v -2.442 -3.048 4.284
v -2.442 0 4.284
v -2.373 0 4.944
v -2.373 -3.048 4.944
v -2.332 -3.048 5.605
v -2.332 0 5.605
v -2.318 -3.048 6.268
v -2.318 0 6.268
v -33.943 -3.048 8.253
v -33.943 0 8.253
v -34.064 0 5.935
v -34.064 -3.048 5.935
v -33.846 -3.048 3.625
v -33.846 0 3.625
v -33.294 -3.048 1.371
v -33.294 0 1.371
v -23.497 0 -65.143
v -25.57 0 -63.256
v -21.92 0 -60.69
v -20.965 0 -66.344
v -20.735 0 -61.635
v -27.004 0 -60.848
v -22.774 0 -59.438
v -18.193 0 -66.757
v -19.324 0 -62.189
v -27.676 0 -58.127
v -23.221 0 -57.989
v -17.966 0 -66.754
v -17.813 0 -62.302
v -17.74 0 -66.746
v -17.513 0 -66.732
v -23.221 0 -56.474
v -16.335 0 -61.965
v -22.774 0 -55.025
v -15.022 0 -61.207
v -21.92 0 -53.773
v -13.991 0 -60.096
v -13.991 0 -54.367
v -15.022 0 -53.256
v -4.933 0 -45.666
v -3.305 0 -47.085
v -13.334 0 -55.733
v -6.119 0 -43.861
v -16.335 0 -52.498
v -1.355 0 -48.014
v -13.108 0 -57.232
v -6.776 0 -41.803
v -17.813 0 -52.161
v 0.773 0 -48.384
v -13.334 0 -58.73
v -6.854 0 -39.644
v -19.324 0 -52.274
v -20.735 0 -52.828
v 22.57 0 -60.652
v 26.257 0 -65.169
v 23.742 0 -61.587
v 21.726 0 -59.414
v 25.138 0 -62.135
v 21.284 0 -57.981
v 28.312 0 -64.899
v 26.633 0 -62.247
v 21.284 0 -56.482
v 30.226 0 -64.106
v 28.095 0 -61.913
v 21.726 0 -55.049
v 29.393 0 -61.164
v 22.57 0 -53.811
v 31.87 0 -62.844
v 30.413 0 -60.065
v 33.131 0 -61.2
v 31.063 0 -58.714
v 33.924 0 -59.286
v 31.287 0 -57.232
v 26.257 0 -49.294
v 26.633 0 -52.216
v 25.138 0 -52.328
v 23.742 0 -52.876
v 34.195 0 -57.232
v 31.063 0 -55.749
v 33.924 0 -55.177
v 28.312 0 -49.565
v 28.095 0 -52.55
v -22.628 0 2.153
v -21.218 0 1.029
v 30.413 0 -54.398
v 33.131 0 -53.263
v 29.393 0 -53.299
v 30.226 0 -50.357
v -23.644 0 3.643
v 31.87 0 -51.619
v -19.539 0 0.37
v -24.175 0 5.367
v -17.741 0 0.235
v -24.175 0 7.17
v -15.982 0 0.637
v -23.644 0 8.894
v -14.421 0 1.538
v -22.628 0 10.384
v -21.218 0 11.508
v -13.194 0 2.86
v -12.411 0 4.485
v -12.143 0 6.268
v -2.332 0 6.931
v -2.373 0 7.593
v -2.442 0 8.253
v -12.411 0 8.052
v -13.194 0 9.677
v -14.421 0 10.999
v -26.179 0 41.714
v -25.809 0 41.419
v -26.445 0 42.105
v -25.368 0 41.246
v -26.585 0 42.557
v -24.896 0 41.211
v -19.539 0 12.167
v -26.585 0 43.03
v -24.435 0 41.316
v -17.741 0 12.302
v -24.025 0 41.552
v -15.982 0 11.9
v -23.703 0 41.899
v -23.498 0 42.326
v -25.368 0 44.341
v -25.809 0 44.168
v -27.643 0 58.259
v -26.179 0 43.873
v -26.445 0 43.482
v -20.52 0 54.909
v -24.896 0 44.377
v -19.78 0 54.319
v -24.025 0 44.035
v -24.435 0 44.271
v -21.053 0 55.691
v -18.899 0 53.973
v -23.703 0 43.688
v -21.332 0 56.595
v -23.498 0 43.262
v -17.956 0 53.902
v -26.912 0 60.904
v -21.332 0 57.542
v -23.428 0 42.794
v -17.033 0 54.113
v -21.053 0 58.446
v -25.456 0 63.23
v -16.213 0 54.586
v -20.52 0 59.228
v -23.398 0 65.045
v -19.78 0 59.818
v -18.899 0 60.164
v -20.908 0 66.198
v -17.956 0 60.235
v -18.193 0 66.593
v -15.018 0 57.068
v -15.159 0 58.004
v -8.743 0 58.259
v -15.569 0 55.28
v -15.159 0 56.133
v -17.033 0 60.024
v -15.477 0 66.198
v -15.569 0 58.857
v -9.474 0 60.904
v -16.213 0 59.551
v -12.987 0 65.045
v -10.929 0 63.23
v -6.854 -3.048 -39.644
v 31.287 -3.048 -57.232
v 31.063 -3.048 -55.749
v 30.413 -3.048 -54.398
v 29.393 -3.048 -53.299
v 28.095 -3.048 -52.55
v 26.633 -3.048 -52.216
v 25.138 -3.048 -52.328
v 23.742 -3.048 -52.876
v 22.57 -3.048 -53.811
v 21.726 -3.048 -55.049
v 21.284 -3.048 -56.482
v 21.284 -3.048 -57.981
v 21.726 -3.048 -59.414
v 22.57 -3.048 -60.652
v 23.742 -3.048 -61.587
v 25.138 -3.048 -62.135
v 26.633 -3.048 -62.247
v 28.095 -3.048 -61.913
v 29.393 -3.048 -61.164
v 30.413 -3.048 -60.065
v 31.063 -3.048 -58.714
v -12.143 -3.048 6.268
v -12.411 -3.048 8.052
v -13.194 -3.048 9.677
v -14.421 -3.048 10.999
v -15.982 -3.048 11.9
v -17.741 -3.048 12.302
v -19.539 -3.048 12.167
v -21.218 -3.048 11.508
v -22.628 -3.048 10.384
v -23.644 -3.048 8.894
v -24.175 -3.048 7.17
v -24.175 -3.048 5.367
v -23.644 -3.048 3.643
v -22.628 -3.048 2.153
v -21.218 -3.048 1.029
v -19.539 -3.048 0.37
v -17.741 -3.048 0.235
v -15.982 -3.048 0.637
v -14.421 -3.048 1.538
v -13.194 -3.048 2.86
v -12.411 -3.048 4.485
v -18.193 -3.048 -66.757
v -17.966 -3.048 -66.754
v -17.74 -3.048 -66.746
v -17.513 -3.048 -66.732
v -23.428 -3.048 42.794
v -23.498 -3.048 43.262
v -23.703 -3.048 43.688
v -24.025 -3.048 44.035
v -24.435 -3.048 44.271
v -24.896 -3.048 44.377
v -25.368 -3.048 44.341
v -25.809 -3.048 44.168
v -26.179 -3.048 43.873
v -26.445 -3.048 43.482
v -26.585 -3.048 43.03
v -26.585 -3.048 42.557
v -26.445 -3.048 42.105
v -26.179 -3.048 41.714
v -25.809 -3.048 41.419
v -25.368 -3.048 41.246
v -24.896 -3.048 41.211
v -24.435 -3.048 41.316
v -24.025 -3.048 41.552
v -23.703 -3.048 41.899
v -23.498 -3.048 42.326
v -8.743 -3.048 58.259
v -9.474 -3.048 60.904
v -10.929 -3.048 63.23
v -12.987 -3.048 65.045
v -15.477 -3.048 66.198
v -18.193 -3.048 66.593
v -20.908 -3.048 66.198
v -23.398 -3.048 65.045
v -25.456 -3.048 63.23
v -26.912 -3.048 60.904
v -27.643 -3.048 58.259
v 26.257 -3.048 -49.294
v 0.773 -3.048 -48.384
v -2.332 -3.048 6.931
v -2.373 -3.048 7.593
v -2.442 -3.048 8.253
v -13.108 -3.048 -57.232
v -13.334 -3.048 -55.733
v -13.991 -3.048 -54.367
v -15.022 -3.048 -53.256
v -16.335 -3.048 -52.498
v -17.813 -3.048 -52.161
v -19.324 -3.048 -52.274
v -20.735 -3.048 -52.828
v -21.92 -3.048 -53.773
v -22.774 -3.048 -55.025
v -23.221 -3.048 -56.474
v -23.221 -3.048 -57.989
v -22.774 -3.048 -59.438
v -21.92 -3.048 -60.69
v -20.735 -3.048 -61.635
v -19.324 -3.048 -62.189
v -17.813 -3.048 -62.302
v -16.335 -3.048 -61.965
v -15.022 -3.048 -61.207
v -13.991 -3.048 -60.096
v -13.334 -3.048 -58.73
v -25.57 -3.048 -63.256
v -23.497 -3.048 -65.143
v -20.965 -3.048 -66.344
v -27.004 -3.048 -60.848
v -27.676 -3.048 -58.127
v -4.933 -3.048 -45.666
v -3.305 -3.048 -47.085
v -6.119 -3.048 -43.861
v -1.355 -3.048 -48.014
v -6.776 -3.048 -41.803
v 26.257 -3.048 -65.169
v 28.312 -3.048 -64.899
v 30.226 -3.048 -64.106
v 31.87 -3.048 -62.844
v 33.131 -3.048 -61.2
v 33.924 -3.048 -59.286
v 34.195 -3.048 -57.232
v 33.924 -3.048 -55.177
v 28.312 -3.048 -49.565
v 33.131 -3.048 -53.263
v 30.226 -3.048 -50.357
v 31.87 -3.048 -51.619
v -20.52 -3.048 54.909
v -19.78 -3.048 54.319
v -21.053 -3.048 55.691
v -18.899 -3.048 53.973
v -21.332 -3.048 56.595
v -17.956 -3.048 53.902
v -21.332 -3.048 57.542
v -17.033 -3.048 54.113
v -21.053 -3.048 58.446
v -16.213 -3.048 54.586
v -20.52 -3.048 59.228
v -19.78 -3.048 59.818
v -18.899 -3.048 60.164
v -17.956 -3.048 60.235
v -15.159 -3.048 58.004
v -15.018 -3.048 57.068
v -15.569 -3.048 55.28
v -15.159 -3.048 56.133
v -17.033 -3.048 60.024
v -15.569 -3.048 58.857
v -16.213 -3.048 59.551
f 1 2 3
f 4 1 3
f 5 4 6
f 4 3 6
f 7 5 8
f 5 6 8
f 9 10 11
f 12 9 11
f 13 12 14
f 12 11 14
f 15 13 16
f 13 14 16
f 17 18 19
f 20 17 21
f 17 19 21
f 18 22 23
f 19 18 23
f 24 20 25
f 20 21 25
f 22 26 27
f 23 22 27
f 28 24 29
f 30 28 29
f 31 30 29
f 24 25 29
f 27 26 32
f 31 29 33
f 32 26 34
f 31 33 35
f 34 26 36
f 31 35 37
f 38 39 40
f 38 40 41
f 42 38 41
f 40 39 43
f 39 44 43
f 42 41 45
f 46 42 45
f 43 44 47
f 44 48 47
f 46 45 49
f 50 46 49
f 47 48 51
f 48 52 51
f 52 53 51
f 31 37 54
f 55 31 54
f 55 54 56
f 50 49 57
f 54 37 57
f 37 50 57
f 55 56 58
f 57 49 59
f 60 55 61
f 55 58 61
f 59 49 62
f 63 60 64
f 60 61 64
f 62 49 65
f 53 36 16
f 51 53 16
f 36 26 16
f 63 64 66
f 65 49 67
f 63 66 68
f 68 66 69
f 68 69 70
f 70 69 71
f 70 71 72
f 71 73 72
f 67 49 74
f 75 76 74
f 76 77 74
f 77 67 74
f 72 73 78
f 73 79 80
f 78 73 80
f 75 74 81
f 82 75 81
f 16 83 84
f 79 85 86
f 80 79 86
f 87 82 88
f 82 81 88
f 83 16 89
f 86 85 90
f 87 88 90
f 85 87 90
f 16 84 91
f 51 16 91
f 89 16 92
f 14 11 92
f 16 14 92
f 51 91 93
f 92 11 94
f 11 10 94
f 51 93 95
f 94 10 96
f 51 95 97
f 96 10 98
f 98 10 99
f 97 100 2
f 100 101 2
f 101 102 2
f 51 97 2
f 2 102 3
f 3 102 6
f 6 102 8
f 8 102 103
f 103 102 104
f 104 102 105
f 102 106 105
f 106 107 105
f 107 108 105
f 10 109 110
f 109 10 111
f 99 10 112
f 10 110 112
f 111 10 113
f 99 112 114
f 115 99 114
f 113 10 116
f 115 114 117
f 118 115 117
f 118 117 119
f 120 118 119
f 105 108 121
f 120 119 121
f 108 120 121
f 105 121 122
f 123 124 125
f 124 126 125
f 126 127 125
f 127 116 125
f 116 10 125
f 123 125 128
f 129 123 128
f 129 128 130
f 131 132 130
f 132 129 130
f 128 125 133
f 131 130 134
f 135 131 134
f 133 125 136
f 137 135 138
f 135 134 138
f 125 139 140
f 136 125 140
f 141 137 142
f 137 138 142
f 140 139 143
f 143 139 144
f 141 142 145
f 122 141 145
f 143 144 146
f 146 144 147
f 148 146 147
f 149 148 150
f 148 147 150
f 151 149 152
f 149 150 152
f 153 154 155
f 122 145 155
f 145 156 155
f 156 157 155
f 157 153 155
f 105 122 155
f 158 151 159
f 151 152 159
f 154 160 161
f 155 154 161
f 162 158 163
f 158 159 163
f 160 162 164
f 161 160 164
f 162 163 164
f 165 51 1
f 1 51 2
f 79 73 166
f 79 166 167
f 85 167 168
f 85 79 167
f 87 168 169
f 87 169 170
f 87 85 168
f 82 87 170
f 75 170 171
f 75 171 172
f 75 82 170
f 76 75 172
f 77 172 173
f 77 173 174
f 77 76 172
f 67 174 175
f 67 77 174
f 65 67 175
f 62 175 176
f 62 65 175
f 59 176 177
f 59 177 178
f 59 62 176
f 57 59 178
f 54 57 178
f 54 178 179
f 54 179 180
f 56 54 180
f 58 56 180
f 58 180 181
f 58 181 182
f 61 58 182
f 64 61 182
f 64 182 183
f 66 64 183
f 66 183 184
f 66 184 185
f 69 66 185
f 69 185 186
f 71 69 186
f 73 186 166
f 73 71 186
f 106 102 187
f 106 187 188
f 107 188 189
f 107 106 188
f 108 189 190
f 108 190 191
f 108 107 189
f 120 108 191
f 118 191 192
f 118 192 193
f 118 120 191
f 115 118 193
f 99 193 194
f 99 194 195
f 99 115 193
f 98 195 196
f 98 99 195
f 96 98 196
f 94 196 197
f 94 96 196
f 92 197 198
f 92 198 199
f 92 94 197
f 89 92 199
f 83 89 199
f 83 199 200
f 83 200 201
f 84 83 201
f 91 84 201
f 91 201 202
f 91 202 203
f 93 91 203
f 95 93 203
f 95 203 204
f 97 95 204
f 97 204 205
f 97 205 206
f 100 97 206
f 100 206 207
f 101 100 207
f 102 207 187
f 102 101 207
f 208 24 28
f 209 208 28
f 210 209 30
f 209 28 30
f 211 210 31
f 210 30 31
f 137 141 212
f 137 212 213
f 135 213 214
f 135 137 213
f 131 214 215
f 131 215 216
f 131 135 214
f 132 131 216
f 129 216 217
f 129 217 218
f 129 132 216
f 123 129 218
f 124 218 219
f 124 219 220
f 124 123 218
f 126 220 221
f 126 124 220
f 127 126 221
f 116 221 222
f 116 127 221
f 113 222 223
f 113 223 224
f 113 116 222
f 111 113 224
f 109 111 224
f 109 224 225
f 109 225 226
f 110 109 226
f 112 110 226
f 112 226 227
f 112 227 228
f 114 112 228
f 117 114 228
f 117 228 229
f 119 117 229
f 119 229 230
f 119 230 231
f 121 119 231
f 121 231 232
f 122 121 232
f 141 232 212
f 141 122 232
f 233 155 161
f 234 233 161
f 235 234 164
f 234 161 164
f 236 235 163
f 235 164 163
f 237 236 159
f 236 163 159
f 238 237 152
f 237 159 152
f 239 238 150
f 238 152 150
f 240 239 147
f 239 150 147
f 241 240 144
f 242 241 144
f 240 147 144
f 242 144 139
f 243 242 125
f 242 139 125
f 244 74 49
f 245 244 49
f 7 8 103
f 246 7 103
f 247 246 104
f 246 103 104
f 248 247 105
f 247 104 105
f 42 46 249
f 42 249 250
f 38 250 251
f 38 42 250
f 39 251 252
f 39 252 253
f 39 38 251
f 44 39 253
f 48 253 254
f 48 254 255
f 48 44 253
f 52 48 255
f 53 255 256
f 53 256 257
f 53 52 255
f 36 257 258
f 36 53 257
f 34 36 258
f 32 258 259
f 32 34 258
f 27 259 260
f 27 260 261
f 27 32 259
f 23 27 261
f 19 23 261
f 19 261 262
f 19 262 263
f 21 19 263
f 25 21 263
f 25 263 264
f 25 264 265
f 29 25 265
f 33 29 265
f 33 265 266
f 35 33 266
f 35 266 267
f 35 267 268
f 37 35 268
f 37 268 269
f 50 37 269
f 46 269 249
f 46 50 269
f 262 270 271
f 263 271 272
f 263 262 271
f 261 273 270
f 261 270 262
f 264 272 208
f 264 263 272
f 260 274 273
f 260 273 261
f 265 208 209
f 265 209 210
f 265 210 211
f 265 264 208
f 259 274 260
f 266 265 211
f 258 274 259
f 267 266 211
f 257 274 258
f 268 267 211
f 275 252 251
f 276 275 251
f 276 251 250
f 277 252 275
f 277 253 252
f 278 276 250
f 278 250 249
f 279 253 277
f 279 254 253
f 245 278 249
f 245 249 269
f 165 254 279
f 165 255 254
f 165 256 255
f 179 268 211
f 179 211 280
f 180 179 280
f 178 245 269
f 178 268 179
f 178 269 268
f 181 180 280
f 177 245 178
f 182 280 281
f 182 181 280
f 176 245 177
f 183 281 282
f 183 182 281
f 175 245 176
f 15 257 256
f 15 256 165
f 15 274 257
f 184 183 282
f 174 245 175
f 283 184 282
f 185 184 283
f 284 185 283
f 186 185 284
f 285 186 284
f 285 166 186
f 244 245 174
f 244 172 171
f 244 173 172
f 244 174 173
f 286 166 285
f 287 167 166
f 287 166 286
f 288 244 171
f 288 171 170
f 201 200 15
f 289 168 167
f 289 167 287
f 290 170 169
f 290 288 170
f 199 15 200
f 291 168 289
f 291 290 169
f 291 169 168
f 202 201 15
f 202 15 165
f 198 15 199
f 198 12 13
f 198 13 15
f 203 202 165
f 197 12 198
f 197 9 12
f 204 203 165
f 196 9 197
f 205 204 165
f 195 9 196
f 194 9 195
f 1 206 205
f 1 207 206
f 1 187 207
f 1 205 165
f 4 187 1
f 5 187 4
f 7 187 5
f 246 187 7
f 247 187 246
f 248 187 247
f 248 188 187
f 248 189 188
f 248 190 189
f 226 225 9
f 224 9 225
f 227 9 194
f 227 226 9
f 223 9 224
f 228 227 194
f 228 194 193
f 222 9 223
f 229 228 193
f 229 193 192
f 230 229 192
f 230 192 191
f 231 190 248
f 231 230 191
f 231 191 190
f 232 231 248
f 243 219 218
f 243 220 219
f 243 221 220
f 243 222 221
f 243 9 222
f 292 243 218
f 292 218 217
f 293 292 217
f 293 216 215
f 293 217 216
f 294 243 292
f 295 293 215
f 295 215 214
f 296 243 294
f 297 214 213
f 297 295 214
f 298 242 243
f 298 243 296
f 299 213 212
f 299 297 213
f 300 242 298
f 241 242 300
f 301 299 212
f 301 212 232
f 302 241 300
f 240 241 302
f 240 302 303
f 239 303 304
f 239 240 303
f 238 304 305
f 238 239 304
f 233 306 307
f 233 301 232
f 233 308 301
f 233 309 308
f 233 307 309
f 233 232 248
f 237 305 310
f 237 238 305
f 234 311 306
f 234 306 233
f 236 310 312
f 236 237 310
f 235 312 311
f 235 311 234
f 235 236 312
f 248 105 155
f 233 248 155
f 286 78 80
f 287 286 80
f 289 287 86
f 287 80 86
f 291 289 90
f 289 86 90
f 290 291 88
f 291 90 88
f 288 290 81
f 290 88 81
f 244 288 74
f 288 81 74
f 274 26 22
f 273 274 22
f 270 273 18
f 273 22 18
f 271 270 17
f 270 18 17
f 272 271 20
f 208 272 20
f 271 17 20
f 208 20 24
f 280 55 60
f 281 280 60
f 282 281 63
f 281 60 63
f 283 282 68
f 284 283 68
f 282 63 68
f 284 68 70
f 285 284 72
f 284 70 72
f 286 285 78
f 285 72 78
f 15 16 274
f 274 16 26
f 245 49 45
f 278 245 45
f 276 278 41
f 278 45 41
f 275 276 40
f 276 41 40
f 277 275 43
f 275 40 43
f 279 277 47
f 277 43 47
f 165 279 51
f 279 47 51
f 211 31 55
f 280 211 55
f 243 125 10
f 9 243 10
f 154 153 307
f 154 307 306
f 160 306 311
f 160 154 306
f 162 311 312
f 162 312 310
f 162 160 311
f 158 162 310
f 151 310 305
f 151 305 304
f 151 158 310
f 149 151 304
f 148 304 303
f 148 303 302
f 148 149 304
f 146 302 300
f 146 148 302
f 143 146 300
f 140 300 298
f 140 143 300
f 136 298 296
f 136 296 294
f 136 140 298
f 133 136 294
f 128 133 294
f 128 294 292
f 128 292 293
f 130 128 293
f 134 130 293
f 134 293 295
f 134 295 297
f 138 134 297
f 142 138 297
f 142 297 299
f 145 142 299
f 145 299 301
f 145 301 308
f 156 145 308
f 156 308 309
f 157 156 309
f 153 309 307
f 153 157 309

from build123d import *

# Parameters (mm, degrees)
F0_R     = 3.175
F0_R_2   = 1.5875
F0_R_3   = 6.050143
F0_R_4   = 5.085047
F0_R_5   = 5.029505
F1_DEPTH = 3.048


with BuildPart() as f1:
    # F0 (on Front) → F1 (new body)
    with BuildSketch(Plane.XZ):
        with BuildLine():
            ThreePointArc((-27.6431, 58.259068), (-18.78929, 47.562138), (-8.667807, 57.068443))
            ThreePointArc((-8.667807, 57.068443), (-8.686502, 57.664927), (-8.742514, 58.259068))
            ThreePointArc((-8.742514, 58.259068), (-18.192807, 66.593443), (-27.6431, 58.259068))
        make_face()
        with Locations((-18.192807, 57.068443)):
            Circle(F0_R, mode=Mode.SUBTRACT)
        with BuildLine():
            ThreePointArc((-8.742514, 58.259068), (-8.686502, 57.664927), (-8.667807, 57.068443))
            ThreePointArc((-8.667807, 57.068443), (-18.78929, 47.562138), (-27.6431, 58.259068))
            Line((-27.6431, 58.259068), (-33.943295, 8.252818))
            ThreePointArc((-33.943295, 8.252818), (-18.192807, 22.143443), (-2.442319, 8.252818))
            Line((-2.442319, 8.252818), (-8.742514, 58.259068))
        make_face()
        with Locations((-25.015112, 42.793643)):
            Circle(F0_R_2, mode=Mode.SUBTRACT)
        with BuildLine():
            ThreePointArc((-2.317807, 6.268443), (-2.348966, 7.262582), (-2.442319, 8.252818))
            ThreePointArc((-2.442319, 8.252818), (-18.192807, 22.143443), (-33.943295, 8.252818))
            Line((-33.943295, 8.252818), (-33.29351, 1.371057))
            ThreePointArc((-33.29351, 1.371057), (-16.700506, -9.53626), (-2.442319, 4.284068))
            ThreePointArc((-2.442319, 4.284068), (-2.348966, 5.274305), (-2.317807, 6.268443))
        make_face()
        with Locations((-18.192807, 6.268443)):
            Circle(F0_R_3, mode=Mode.SUBTRACT)
        with BuildLine():
            Line((-33.29351, 1.371057), (-33.943295, 8.252818))
            ThreePointArc((-33.943295, 8.252818), (-33.997511, 4.776142), (-33.29351, 1.371057))
        make_face()
        with BuildLine():
            ThreePointArc((-2.442319, 4.284068), (-16.700506, -9.53626), (-33.29351, 1.371057))
            Line((-33.29351, 1.371057), (-27.675629, -58.126937))
            ThreePointArc((-27.675629, -58.126937), (-18.640994, -47.717107), (-8.667807, -57.231557))
            ThreePointArc((-8.667807, -57.231557), (-11.221517, -63.722068), (-17.513317, -66.732289))
            Line((-17.513317, -66.732289), (26.257193, -65.169057))
            ThreePointArc((26.257193, -65.169057), (18.319693, -57.231557), (26.257193, -49.294057))
            Line((26.257193, -49.294057), (0.772915, -48.383904))
            ThreePointArc((0.772915, -48.383904), (-4.933398, -45.66608), (-6.853743, -39.644382))
            Line((-6.853743, -39.644382), (-2.442319, 4.284068))
        make_face()
        with BuildLine():
            ThreePointArc((-8.667807, -57.231557), (-18.640994, -47.717107), (-27.675629, -58.126937))
            ThreePointArc((-27.675629, -58.126937), (-24.603623, -64.276205), (-18.192807, -66.756557))
            Line((-18.192807, -66.756557), (-17.513317, -66.732289))
            ThreePointArc((-17.513317, -66.732289), (-11.221517, -63.722068), (-8.667807, -57.231557))
        make_face()
        with Locations((-18.192807, -57.231557)):
            Circle(F0_R_4, mode=Mode.SUBTRACT)
        with BuildLine():
            Line((-17.513317, -66.732289), (-18.192807, -66.756557))
            ThreePointArc((-18.192807, -66.756557), (-17.852845, -66.750488), (-17.513317, -66.732289))
        make_face()
        with BuildLine():
            ThreePointArc((34.194693, -57.231557), (31.869853, -51.618897), (26.257193, -49.294057))
            ThreePointArc((26.257193, -49.294057), (18.319693, -57.231557), (26.257193, -65.169057))
            ThreePointArc((26.257193, -65.169057), (31.869853, -62.844217), (34.194693, -57.231557))
        make_face()
        with Locations((26.257193, -57.231557)):
            Circle(F0_R_5, mode=Mode.SUBTRACT)
    extrude(amount=F1_DEPTH)


solid = f1.part
